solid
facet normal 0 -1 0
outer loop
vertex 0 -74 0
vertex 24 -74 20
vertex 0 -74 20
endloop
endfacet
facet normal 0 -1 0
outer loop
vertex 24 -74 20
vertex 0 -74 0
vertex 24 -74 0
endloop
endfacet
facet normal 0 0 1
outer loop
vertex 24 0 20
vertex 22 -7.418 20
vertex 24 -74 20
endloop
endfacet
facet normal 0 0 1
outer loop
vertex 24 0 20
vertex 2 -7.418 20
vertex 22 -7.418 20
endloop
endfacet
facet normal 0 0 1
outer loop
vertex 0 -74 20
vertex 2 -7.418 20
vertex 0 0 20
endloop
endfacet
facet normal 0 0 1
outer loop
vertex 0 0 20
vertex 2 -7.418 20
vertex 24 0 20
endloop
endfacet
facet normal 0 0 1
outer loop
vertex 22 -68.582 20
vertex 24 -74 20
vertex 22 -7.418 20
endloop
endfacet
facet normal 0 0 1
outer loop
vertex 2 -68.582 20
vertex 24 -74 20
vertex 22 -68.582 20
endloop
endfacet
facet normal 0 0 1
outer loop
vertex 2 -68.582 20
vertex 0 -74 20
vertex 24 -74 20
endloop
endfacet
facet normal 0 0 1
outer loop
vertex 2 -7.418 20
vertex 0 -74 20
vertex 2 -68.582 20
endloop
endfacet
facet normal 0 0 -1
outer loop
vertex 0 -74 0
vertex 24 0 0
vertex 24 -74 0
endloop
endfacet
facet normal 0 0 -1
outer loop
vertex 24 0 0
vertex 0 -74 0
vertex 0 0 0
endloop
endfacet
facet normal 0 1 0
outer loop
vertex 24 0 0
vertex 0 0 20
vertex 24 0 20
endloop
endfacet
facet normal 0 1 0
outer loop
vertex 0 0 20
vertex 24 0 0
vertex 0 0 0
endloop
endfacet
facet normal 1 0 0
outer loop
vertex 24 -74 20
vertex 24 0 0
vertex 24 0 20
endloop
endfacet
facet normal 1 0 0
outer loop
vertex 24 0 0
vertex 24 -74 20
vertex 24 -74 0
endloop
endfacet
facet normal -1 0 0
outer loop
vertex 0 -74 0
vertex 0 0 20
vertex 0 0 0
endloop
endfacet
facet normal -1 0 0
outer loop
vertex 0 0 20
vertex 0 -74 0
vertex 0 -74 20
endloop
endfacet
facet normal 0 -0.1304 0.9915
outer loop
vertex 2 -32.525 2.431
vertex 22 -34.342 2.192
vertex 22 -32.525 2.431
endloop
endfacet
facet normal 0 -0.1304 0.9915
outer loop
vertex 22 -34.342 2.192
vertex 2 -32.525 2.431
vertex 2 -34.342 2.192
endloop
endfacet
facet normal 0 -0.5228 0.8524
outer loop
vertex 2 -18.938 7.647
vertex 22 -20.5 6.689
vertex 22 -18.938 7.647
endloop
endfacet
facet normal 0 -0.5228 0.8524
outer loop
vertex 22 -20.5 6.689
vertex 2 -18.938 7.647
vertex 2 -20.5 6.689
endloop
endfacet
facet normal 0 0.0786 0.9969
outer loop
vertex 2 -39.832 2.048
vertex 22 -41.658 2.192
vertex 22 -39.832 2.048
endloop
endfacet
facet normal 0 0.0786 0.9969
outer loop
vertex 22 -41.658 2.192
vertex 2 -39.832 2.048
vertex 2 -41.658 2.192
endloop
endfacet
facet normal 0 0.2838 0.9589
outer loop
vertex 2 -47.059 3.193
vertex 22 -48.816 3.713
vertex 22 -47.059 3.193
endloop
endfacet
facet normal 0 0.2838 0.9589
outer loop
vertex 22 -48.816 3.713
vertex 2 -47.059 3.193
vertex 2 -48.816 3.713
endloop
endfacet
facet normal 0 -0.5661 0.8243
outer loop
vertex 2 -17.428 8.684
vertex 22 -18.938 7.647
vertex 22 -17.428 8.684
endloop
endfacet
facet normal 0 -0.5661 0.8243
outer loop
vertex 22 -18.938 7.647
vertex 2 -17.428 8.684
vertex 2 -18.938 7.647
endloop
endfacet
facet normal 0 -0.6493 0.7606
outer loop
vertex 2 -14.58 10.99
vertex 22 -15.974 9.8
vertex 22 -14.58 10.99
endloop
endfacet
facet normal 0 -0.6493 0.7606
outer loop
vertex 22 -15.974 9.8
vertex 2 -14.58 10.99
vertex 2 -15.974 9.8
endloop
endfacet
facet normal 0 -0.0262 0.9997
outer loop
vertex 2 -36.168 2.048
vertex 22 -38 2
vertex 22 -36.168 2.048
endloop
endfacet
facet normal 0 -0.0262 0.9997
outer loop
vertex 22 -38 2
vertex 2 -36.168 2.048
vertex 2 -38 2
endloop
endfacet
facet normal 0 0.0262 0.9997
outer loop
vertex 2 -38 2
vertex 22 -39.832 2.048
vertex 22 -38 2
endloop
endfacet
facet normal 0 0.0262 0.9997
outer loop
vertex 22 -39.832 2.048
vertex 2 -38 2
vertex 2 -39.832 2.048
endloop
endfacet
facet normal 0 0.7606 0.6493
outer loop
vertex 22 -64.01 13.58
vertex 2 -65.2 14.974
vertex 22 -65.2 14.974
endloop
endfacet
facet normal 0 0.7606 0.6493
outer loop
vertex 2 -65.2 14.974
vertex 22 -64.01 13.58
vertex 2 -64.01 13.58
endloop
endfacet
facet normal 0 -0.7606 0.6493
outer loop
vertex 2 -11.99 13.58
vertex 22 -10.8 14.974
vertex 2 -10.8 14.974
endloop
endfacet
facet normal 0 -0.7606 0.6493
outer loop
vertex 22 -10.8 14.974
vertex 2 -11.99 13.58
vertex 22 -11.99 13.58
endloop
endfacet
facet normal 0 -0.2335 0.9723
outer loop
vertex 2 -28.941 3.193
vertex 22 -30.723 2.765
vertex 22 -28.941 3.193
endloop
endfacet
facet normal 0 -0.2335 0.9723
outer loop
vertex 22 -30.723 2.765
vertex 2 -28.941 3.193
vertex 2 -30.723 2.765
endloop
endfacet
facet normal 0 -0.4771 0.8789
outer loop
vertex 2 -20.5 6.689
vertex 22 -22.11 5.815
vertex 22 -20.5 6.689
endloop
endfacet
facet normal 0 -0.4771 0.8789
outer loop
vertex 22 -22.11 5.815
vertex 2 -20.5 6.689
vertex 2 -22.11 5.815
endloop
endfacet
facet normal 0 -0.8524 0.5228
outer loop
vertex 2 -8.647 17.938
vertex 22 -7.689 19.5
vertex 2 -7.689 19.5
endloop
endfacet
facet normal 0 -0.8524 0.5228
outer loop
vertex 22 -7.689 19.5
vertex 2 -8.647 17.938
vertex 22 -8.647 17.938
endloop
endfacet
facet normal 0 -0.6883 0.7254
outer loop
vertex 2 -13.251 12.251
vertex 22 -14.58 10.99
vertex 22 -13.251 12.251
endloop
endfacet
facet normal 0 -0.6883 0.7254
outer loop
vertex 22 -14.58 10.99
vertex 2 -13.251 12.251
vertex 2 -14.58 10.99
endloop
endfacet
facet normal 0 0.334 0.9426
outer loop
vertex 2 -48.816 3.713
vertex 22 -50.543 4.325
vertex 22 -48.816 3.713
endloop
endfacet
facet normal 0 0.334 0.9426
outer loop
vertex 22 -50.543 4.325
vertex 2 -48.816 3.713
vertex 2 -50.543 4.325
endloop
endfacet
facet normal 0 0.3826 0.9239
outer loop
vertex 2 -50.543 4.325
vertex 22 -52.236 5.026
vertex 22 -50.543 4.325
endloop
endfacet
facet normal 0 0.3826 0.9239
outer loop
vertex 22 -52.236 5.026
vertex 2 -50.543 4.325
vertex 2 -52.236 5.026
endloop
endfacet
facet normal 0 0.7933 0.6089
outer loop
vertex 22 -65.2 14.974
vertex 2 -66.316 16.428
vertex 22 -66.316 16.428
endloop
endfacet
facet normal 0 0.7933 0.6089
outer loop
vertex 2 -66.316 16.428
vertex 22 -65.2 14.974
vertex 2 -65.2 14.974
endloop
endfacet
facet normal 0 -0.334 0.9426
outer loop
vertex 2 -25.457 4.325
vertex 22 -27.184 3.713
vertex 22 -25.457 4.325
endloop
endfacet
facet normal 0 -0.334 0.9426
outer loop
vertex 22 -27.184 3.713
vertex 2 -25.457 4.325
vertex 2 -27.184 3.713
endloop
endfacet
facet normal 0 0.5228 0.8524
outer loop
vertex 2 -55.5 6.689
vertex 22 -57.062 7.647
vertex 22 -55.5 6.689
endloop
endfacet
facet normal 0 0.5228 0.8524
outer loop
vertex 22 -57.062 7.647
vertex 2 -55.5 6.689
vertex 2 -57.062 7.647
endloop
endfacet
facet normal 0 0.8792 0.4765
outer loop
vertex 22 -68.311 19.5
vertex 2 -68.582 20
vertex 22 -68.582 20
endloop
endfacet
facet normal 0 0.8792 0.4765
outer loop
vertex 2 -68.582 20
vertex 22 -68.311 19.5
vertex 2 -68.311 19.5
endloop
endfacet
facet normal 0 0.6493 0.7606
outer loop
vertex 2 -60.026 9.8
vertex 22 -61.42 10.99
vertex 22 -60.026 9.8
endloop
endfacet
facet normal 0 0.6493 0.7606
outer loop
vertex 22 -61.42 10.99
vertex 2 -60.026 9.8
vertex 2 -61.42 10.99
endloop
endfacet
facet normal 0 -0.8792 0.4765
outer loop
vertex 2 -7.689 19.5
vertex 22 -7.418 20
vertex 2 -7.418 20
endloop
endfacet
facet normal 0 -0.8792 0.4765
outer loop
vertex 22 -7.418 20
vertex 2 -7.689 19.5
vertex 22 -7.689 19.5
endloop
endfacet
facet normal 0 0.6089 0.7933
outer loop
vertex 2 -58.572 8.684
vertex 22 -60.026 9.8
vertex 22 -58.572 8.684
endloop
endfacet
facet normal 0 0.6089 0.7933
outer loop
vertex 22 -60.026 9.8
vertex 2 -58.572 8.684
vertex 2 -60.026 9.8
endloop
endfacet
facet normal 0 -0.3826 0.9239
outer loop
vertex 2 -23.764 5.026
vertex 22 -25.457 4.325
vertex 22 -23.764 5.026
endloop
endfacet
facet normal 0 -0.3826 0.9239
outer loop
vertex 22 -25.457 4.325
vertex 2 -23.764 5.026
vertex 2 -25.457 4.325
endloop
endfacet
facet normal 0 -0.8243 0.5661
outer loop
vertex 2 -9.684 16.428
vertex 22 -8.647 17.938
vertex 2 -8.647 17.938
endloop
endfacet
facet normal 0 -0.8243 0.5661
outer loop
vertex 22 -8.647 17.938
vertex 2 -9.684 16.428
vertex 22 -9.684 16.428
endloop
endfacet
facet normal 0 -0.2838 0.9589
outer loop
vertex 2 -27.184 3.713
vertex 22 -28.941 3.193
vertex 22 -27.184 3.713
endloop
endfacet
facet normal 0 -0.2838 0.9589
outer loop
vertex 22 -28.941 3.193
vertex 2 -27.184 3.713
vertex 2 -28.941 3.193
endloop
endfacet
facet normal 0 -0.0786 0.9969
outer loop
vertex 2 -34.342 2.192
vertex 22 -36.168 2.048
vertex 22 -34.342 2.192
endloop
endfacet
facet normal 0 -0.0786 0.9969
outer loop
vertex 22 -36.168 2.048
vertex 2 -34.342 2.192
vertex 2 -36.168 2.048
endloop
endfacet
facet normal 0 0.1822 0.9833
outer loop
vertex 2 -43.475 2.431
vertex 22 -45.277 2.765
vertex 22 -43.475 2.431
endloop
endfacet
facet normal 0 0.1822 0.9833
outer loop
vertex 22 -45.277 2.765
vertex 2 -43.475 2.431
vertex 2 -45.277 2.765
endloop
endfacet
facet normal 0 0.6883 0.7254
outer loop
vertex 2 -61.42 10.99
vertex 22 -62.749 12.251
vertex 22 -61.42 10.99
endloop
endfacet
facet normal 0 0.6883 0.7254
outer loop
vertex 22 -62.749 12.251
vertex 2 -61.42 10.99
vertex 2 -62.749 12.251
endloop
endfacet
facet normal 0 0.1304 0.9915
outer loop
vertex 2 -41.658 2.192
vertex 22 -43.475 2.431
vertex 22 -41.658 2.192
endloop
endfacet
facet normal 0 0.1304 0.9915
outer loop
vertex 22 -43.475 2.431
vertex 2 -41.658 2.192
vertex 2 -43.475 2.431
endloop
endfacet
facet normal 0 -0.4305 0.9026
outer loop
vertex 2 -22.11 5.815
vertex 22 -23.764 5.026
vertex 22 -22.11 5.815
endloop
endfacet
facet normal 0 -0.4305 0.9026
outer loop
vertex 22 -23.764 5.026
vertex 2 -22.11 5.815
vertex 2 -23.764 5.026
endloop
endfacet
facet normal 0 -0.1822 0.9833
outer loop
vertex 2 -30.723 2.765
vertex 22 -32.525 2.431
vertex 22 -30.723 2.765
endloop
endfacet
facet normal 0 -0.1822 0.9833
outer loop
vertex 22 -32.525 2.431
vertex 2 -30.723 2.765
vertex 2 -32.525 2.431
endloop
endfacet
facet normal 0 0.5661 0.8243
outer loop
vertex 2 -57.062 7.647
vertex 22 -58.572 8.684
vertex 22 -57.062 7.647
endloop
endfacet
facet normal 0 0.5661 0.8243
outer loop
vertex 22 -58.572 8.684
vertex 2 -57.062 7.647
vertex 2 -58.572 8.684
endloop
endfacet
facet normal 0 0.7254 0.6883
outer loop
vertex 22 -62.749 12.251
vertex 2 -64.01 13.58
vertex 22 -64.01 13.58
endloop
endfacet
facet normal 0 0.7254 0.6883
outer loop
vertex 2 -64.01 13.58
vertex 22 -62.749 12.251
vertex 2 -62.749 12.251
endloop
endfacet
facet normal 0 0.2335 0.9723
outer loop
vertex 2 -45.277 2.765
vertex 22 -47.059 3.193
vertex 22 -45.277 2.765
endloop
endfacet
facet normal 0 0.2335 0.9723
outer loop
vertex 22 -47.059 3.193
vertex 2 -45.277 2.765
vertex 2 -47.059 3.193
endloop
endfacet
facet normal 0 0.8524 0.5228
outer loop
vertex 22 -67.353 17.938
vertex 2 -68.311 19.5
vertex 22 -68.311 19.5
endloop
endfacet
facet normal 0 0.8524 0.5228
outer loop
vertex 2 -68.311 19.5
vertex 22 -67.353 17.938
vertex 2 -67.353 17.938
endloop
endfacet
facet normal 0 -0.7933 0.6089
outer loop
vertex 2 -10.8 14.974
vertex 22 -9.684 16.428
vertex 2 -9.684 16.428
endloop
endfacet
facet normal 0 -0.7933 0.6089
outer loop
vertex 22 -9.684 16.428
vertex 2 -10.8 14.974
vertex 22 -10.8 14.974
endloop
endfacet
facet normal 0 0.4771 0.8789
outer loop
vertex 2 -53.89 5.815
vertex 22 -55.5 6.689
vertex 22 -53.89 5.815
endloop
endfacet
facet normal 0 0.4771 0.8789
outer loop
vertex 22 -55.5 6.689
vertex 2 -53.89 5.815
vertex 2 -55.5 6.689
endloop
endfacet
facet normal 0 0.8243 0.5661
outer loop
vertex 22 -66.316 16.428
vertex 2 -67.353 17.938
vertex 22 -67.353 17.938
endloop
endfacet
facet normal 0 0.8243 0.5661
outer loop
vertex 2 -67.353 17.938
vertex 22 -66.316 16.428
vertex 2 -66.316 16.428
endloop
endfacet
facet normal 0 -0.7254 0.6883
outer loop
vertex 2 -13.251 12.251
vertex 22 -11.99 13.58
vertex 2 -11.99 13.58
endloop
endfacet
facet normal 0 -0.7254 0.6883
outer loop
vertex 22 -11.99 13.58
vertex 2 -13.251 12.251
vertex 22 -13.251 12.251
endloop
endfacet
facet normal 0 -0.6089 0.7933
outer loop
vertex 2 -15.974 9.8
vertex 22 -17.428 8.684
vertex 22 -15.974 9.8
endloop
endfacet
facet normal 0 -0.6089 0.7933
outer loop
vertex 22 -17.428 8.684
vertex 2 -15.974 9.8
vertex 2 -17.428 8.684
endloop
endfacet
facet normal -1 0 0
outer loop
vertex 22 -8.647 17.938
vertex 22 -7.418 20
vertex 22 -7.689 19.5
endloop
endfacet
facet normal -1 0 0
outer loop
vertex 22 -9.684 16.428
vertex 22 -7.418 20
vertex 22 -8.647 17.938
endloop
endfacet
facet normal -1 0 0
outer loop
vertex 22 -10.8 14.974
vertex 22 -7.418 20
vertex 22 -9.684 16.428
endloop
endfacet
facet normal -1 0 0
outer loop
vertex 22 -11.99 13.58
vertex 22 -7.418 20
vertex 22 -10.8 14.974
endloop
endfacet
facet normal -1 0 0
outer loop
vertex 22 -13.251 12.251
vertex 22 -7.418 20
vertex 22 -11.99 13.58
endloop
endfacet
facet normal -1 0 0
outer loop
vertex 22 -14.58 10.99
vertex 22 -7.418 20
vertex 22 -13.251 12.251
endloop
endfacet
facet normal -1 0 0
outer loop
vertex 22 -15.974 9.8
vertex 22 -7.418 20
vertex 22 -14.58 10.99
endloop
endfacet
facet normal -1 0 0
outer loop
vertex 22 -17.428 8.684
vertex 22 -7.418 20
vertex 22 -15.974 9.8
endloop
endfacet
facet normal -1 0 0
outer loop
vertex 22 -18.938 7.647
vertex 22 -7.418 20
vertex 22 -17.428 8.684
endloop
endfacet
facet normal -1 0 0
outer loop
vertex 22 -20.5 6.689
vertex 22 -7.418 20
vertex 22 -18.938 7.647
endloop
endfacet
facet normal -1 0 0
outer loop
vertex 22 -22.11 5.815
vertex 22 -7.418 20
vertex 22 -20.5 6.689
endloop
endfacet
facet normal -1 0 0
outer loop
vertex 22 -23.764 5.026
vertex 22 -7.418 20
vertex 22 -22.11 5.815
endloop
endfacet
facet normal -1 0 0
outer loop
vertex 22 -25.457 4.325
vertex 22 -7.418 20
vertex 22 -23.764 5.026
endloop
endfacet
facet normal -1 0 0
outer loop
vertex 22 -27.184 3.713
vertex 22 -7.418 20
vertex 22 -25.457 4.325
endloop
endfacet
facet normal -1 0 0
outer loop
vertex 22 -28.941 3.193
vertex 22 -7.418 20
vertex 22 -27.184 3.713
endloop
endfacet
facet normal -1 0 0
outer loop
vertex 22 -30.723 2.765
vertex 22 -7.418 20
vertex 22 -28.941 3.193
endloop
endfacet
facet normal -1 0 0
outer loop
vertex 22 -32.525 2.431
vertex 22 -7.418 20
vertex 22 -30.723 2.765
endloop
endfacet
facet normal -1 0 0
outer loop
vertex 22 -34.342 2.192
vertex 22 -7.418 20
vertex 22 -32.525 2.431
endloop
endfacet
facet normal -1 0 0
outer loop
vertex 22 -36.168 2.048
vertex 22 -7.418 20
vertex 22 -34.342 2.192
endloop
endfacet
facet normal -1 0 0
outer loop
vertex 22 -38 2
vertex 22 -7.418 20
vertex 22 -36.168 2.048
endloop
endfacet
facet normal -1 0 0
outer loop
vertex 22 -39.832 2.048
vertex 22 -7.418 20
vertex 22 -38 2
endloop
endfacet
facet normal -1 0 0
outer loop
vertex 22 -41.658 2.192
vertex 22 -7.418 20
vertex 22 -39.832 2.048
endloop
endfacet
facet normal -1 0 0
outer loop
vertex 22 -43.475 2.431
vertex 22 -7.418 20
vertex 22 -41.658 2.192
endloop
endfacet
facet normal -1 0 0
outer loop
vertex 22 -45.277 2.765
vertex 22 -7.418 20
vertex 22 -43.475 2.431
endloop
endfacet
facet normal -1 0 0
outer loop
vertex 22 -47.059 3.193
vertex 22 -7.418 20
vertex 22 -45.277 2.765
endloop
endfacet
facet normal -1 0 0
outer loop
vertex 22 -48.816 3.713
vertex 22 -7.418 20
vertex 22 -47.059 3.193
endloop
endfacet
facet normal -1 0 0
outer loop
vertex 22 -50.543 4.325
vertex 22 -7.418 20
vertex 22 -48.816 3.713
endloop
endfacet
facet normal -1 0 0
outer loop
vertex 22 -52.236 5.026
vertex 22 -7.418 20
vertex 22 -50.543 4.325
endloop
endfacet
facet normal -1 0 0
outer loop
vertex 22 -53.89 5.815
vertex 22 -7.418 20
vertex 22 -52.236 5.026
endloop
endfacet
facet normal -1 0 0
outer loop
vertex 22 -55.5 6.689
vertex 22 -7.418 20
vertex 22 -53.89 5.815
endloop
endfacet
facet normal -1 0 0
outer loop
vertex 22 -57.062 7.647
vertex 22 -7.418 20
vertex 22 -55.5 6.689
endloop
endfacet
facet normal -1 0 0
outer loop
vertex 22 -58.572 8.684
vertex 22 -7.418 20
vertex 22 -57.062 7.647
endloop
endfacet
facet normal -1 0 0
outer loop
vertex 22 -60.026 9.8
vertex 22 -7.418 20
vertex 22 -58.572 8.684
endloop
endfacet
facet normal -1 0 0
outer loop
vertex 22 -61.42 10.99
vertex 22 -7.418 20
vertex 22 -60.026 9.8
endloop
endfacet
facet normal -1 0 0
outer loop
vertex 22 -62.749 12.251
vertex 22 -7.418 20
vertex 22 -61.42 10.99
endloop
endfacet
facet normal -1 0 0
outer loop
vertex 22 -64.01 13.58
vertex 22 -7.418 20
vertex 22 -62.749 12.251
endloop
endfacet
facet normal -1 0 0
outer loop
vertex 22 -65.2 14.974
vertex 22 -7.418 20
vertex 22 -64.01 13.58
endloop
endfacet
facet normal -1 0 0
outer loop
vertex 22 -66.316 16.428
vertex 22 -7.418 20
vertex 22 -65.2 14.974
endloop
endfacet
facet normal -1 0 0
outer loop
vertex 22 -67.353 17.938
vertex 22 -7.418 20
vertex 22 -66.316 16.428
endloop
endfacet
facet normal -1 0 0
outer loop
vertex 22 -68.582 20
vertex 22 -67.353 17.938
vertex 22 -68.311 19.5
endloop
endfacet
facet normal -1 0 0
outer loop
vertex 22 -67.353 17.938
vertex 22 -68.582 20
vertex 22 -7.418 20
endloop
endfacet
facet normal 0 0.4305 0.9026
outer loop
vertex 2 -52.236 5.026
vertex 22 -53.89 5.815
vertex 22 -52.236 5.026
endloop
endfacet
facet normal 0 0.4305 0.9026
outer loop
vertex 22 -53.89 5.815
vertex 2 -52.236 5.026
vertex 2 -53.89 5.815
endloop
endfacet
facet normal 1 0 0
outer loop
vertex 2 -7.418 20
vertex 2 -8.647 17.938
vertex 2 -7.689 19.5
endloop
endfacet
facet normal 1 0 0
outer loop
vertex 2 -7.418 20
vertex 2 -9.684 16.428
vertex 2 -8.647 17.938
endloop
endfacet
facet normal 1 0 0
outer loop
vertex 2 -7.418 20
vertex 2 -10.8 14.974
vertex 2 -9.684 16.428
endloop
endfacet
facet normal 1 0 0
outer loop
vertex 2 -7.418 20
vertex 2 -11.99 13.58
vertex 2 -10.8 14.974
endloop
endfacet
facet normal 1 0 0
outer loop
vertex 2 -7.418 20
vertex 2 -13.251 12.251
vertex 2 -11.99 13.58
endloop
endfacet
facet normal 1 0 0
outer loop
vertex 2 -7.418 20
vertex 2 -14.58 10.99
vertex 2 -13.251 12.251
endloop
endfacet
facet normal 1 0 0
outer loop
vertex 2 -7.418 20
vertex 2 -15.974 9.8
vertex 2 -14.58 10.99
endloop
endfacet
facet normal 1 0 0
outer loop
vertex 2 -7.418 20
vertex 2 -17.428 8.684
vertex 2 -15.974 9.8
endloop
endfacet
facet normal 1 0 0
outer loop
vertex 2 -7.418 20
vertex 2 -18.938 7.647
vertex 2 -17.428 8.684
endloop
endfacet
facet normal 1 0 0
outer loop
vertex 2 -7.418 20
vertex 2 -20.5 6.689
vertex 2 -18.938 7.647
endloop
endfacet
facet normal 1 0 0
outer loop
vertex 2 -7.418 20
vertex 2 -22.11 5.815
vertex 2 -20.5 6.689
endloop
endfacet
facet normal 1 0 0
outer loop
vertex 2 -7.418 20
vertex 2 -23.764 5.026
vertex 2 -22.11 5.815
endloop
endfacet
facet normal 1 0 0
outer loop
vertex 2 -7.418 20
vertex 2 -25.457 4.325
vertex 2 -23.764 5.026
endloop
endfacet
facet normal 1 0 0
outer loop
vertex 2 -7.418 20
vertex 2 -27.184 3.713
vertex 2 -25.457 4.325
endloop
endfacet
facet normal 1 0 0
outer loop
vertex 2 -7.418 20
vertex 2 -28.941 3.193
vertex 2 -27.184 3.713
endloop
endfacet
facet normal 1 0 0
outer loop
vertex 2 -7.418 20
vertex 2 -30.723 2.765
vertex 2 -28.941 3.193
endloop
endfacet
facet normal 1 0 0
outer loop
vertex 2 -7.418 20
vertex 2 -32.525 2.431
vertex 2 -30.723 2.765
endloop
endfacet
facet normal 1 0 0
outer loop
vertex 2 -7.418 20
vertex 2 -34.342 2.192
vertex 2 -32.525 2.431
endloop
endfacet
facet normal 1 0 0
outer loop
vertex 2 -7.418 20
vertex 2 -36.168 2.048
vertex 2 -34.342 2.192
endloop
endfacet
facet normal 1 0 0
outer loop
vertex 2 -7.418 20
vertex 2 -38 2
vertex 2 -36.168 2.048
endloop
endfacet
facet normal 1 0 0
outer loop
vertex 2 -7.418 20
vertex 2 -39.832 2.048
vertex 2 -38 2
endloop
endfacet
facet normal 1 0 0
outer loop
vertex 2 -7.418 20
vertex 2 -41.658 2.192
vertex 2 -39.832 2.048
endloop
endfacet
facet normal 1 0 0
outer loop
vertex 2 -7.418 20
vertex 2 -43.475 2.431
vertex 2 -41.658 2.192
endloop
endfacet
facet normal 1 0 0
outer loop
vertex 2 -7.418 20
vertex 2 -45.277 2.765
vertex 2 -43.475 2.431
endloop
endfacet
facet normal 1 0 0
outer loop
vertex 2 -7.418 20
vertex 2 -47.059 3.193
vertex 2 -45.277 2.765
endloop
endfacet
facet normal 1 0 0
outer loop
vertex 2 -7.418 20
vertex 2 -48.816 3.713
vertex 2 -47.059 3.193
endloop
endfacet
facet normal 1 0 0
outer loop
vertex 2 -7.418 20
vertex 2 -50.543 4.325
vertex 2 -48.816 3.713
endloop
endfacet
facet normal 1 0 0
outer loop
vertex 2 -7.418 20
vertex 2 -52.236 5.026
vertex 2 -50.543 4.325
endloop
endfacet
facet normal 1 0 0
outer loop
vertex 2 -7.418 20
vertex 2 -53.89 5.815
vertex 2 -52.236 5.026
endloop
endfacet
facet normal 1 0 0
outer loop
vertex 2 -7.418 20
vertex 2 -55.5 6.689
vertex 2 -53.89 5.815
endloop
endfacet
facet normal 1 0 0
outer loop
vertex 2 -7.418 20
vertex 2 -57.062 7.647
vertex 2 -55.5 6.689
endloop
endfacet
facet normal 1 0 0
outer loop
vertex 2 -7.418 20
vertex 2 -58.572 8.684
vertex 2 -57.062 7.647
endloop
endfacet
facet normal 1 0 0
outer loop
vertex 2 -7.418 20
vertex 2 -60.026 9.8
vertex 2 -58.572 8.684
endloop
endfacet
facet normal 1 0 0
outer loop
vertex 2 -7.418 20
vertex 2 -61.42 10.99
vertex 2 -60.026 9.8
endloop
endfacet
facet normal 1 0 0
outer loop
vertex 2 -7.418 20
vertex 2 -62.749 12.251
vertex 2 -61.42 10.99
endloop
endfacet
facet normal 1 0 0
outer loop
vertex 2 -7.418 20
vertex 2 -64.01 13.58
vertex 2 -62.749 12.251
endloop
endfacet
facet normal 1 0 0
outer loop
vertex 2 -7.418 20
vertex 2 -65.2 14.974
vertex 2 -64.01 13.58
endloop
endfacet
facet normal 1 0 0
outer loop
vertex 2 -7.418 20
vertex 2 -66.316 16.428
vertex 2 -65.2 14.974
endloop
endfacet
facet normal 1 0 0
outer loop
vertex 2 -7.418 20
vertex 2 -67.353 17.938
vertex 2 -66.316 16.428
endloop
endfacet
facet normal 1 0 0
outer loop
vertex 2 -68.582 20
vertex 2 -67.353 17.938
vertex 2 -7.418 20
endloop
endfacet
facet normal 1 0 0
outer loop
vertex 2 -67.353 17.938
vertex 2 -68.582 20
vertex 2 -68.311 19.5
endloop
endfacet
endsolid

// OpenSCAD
difference() {
    rotate(a=270, v=[0, 0, 1]) {
        cube([74, 24, 20 ]);
    }

    color("Pink", 1.0) {
        translate([2, -38, 37]) {
            rotate(a=90, v=[0,1,0]) {
                cylinder(r = 35, h = 20, $fn = 120);
            }
        }
    }
}
